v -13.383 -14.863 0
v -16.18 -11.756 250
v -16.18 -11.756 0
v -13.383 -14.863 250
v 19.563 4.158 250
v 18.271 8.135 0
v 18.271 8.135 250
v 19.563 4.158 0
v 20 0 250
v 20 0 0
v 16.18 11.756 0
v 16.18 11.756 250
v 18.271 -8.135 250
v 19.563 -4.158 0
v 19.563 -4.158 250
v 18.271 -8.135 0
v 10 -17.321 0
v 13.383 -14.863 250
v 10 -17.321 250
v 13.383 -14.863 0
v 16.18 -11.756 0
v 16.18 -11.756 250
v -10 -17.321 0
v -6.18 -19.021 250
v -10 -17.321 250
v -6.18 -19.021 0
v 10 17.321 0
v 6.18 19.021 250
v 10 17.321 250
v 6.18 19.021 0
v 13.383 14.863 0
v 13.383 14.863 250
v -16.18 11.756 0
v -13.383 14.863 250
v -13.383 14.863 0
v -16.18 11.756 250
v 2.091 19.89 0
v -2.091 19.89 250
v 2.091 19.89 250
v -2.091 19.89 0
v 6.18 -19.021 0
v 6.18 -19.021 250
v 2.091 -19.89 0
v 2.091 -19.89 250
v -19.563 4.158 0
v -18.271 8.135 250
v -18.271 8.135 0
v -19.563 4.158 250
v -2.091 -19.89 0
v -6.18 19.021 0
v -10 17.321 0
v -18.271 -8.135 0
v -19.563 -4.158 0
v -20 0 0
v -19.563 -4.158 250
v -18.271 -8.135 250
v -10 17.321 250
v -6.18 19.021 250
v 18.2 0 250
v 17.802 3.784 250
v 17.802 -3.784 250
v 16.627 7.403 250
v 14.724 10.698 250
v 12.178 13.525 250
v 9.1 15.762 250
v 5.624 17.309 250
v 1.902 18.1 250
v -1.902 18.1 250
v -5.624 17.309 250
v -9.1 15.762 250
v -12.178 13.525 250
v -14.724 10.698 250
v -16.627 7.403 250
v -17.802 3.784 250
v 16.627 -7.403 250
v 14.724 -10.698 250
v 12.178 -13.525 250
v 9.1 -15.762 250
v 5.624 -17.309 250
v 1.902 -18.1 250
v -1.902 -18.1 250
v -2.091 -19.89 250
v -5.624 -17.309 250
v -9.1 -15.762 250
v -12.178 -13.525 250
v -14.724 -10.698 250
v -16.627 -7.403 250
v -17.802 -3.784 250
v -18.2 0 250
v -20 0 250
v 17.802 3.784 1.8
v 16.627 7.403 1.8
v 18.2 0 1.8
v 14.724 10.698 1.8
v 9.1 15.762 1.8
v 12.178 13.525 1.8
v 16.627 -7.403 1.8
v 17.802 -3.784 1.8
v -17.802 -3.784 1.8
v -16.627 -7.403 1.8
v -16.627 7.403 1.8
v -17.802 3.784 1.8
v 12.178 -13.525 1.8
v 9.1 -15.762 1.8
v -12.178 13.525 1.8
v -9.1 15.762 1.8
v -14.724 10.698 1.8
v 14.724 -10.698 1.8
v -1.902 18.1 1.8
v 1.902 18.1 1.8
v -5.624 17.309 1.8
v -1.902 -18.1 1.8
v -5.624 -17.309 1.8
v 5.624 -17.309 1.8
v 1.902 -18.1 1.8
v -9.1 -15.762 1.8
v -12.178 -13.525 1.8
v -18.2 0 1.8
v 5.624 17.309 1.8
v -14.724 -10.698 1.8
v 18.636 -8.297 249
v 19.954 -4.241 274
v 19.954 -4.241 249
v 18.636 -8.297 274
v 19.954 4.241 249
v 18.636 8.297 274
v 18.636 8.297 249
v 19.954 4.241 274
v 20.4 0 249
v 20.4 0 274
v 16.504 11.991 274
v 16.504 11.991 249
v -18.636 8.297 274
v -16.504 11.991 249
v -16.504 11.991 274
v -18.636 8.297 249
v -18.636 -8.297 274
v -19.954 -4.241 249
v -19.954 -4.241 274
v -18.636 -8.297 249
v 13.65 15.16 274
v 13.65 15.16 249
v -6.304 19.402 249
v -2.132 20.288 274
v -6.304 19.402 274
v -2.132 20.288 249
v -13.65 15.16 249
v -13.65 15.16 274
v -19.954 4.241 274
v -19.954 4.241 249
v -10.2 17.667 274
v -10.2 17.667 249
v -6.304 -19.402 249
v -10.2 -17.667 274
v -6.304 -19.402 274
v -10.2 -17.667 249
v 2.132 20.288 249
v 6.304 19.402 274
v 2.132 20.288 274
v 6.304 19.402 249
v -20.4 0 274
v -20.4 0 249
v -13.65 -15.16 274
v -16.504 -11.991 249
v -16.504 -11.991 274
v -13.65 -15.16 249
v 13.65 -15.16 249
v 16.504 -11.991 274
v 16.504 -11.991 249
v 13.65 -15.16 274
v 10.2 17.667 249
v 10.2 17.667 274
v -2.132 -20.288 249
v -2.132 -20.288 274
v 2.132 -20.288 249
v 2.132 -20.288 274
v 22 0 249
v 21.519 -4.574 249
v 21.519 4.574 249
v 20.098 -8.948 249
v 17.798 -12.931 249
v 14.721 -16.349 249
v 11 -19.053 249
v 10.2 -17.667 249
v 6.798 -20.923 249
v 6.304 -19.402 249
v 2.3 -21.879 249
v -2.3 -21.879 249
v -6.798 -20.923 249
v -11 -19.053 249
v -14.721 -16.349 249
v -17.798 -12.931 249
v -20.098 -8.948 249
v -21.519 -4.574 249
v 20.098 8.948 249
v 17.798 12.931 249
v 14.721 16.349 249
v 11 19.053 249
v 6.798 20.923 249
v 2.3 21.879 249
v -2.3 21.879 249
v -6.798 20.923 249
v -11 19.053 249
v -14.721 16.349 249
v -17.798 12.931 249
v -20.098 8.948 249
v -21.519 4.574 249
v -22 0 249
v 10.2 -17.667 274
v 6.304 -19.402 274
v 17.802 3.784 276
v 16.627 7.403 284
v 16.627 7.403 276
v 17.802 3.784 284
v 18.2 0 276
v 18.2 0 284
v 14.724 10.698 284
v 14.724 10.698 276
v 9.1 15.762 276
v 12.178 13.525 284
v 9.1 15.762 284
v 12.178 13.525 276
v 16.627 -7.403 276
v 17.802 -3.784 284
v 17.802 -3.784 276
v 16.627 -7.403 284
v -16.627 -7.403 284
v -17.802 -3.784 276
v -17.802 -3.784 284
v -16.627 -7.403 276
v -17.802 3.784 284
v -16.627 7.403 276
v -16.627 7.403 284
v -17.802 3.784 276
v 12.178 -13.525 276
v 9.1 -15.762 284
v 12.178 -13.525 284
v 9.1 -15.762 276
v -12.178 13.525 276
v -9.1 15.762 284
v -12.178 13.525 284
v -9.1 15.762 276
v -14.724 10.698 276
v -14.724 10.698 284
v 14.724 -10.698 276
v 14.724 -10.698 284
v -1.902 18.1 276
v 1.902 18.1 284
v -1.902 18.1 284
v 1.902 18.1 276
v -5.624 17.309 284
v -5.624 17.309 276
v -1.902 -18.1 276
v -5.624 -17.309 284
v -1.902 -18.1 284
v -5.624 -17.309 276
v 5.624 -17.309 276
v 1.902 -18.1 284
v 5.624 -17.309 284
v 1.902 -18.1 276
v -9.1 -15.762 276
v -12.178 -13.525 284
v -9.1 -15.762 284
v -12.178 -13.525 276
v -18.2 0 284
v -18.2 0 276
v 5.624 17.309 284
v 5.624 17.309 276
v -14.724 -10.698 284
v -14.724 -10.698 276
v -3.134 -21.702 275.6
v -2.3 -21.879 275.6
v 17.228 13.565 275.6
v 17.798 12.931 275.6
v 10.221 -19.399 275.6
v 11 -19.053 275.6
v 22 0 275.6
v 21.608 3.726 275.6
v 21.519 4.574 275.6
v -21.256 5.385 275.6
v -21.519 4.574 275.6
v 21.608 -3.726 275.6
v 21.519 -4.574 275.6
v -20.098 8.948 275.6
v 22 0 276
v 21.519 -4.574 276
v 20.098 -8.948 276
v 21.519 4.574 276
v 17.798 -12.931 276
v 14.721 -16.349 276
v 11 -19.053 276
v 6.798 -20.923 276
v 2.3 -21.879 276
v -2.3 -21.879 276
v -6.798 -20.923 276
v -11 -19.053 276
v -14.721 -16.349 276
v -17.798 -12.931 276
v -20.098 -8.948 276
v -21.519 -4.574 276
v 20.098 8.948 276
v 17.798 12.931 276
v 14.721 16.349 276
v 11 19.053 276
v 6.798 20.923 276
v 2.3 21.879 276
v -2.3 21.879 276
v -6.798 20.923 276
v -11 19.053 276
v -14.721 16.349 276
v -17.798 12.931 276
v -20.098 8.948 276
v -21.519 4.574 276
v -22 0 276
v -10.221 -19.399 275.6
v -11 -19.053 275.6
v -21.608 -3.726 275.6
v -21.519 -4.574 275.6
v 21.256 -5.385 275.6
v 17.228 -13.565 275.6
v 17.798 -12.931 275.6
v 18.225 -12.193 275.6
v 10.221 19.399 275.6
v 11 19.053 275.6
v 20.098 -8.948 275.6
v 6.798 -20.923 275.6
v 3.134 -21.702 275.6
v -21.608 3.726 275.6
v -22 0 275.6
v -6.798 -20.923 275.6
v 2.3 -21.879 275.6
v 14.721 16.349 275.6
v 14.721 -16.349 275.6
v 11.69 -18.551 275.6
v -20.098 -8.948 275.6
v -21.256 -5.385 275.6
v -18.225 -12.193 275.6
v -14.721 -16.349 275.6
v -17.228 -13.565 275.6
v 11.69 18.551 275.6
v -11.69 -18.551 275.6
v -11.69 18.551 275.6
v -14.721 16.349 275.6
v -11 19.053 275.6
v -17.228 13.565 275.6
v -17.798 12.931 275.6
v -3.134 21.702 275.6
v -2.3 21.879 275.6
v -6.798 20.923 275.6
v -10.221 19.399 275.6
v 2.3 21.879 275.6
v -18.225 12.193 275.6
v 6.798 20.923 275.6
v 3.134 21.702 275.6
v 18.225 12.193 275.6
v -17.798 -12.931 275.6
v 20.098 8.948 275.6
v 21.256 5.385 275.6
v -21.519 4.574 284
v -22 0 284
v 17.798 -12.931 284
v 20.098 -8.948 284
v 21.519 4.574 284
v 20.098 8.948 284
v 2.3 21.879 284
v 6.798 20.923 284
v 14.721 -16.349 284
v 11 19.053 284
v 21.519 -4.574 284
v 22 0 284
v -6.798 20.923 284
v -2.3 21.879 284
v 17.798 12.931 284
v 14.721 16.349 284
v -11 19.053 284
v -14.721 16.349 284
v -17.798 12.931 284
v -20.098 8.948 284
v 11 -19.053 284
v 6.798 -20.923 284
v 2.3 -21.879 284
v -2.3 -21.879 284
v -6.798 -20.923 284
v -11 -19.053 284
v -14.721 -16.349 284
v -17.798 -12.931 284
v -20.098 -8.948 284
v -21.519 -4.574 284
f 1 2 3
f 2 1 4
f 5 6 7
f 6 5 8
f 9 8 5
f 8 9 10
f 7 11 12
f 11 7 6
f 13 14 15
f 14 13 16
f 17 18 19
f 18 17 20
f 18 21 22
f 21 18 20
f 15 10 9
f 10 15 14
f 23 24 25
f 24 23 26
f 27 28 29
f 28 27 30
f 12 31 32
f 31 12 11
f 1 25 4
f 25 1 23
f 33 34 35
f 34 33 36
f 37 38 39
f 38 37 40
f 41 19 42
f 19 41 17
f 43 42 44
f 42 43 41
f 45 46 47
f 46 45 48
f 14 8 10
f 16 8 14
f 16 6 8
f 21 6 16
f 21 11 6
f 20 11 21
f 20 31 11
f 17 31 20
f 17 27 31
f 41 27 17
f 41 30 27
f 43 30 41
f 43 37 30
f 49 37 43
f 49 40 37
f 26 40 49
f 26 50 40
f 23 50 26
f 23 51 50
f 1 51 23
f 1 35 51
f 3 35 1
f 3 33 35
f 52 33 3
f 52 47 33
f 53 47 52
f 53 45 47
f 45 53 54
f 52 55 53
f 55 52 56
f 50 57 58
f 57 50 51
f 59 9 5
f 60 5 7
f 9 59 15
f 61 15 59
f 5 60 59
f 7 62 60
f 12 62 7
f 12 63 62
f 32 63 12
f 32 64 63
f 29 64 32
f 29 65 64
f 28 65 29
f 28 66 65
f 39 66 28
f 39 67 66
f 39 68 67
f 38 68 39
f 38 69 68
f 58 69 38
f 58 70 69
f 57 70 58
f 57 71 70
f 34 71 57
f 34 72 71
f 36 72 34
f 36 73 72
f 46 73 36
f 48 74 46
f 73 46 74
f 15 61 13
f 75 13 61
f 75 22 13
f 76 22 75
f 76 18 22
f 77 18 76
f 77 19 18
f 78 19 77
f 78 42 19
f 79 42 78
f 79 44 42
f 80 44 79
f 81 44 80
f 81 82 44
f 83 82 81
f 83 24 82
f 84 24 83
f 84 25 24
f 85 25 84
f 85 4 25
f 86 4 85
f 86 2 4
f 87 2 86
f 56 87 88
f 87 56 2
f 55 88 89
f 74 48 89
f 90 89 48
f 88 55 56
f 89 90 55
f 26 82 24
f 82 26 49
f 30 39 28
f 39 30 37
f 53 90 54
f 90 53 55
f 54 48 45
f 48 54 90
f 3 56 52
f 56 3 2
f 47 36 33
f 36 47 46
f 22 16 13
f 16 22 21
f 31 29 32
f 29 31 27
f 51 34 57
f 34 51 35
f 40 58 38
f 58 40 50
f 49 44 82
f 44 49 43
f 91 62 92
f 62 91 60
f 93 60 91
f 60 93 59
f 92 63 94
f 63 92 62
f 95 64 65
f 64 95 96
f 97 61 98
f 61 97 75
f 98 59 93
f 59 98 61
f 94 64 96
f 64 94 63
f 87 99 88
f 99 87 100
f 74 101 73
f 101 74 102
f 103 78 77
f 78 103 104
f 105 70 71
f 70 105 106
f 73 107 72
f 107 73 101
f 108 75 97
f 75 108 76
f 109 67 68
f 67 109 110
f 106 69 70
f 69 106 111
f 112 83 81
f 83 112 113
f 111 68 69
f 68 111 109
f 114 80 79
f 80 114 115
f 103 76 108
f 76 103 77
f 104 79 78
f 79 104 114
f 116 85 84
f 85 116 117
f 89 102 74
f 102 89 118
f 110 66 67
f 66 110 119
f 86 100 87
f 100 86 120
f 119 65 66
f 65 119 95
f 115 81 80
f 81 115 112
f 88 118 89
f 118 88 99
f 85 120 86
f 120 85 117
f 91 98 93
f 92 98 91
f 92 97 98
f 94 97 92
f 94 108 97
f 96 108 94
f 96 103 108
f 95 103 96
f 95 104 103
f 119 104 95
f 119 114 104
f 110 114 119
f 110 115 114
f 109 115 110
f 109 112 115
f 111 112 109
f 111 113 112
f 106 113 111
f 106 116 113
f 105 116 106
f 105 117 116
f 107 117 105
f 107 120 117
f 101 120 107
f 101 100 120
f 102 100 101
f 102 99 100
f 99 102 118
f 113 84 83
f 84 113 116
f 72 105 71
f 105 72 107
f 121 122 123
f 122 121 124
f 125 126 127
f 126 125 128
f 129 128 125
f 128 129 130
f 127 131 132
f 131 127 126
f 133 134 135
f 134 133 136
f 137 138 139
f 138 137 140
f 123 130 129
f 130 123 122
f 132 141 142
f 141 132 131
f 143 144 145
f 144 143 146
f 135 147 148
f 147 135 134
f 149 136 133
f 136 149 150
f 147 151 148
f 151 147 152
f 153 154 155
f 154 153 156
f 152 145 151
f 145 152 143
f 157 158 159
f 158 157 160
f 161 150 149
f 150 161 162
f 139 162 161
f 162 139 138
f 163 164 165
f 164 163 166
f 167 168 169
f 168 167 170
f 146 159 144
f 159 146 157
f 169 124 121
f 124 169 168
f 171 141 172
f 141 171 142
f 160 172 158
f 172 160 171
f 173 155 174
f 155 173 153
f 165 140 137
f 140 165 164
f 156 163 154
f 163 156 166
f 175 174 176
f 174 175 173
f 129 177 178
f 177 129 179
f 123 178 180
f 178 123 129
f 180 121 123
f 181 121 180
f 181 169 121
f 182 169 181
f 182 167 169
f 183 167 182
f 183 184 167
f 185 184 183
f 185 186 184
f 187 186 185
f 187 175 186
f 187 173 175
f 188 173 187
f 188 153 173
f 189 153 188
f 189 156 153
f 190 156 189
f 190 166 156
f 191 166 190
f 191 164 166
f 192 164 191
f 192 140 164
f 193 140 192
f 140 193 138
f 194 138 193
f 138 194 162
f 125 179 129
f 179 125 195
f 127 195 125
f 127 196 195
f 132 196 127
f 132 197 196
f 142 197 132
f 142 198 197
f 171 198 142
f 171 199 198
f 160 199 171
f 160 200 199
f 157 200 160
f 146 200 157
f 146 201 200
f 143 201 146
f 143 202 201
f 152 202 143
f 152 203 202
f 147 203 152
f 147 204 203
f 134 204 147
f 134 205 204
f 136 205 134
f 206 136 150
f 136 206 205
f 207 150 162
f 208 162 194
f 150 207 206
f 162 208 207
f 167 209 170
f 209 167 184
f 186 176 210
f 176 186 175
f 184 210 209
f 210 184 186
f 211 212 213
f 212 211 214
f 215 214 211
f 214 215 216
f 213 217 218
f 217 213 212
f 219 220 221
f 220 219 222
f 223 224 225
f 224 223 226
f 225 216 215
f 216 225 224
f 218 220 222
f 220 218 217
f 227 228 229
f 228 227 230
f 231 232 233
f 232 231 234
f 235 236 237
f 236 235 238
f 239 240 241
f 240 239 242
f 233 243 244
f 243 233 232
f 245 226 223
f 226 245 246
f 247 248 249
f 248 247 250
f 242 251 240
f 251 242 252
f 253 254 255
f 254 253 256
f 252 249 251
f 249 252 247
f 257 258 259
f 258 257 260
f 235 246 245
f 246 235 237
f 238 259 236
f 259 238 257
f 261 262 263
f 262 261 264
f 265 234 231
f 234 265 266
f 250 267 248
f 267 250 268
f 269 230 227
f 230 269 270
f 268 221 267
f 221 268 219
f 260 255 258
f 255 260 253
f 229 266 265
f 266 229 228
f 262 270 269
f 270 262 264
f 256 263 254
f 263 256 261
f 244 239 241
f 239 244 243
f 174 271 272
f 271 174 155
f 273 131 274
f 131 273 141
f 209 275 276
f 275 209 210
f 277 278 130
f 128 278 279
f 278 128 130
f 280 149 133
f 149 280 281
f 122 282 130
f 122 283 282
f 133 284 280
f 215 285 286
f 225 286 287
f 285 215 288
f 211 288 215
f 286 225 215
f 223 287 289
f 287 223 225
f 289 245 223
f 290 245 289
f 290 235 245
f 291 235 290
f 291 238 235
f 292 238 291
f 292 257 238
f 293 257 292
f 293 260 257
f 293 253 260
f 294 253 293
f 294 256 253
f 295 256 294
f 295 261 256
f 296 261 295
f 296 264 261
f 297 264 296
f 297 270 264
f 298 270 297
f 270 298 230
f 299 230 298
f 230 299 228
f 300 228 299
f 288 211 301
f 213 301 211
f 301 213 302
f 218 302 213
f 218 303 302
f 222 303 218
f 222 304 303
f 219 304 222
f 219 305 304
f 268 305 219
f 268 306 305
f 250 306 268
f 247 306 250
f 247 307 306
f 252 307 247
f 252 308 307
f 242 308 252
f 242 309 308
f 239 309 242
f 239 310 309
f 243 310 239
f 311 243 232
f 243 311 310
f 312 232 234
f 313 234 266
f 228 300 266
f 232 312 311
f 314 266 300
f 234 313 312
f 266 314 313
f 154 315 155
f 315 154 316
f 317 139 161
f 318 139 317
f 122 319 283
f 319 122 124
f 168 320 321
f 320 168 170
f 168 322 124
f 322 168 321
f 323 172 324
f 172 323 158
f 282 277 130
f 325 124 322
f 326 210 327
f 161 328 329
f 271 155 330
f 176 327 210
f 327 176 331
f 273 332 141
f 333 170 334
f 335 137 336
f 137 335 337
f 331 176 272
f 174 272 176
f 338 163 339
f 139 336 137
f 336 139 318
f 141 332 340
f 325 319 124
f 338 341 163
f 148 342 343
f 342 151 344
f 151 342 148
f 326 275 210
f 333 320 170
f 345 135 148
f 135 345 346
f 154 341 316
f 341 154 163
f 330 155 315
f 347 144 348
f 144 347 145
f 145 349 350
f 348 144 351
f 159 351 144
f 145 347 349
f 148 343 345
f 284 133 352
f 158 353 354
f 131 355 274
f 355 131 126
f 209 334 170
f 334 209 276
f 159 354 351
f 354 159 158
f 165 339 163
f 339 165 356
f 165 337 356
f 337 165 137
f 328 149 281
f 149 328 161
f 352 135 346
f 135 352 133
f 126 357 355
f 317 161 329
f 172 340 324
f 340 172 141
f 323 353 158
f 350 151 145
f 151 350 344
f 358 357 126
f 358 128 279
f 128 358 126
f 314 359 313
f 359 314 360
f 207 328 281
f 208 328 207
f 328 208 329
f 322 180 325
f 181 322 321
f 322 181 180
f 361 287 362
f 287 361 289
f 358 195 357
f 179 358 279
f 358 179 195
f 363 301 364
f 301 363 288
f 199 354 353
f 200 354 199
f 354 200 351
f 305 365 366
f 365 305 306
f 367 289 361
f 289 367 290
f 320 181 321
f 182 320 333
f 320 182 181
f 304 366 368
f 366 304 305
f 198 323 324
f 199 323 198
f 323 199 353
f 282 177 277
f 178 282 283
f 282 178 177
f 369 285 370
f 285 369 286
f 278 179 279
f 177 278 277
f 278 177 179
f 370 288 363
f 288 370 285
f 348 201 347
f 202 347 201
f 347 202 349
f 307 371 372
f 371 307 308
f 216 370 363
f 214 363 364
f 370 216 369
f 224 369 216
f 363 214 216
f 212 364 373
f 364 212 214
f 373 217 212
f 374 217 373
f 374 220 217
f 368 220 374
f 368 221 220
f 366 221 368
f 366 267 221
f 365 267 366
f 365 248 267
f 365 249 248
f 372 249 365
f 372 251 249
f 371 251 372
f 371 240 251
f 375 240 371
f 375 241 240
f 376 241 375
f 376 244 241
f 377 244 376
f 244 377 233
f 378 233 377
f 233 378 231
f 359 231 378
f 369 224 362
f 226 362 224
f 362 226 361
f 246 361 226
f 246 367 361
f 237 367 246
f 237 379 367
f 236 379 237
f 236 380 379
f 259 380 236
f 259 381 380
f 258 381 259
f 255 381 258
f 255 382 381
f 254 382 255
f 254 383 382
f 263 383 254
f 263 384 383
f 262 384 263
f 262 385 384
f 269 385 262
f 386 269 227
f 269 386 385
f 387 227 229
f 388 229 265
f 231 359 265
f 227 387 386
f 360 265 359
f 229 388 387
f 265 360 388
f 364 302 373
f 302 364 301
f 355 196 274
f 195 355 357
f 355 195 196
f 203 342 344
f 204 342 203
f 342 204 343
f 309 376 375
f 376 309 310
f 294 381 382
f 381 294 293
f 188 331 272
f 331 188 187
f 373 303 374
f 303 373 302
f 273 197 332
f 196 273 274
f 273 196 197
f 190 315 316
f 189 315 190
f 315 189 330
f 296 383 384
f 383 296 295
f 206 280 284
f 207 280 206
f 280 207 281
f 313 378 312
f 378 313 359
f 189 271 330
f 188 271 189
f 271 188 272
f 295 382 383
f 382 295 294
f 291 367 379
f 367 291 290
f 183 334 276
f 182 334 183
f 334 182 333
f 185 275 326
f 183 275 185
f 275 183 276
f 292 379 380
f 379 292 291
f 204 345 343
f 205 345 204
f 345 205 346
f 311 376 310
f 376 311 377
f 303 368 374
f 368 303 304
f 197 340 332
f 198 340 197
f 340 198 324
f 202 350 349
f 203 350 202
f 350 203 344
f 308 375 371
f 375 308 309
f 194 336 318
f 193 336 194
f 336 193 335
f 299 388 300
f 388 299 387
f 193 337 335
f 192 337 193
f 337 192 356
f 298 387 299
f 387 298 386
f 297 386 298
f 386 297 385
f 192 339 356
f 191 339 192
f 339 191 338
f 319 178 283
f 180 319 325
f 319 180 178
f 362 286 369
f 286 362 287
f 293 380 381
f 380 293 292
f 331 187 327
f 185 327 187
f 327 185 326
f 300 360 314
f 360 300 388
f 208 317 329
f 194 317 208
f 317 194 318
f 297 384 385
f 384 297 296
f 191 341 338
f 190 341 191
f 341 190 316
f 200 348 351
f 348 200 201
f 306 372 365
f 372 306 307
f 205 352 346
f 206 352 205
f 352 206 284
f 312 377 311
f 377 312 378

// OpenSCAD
// Parameters
nominal_diameter = 40; //[20:80:1]
length_mm = 250; //[125:500:1]
ht40_outer_diameter = 40; //[20:80:0.5]
wall_thickness = 1.8; //[0.9:3.6:0.1]
include_end_fitting = 1; //[0:1:1]
epsilon_overlap = 1; //[0.5:2:0.1]
fitting_length = 35; //[18:70:1]
fitting_od_extra = 4; //[2:10:0.5]
fitting_socket_depth = 25; //[12:50:1]
fitting_socket_clearance = 0.4; //[0.1:1.2:0.1]
fitting_stop_thickness = 3; //[1.5:6:0.5]
fitting_chamfer_length = 2; //[1:6:0.5]

// HT Pipe - complete geometry
module ht_pipe() {
  color([0.85, 0.85, 0.8]) {
    // Pipe segment
    difference() {
      cylinder(r=ht40_outer_diameter/2, h=length_mm, center=false);
      translate([0, 0, wall_thickness])
        cylinder(r=ht40_outer_diameter/2 - wall_thickness, h=length_mm, center=false);
    }
    
    // End fitting
    if (include_end_fitting) {
      translate([0, 0, length_mm - epsilon_overlap]) {
        difference() {
          cylinder(r=(ht40_outer_diameter + fitting_od_extra)/2, h=fitting_length, center=false);
          union() {
            cylinder(r=ht40_outer_diameter/2 + fitting_socket_clearance, h=fitting_socket_depth, center=false);
            cylinder(r=ht40_outer_diameter/2 - wall_thickness, h=fitting_length + epsilon_overlap, center=false);
            translate([0, 0, fitting_socket_depth])
              cylinder(r1=ht40_outer_diameter/2 + fitting_socket_clearance, 
                       r2=ht40_outer_diameter/2 + fitting_socket_clearance + fitting_chamfer_length, 
                       h=fitting_chamfer_length, center=false);
          }
        }
      }
    }
  }
}

// Assembly
module assembly() {
  ht_pipe();
}

assembly();
